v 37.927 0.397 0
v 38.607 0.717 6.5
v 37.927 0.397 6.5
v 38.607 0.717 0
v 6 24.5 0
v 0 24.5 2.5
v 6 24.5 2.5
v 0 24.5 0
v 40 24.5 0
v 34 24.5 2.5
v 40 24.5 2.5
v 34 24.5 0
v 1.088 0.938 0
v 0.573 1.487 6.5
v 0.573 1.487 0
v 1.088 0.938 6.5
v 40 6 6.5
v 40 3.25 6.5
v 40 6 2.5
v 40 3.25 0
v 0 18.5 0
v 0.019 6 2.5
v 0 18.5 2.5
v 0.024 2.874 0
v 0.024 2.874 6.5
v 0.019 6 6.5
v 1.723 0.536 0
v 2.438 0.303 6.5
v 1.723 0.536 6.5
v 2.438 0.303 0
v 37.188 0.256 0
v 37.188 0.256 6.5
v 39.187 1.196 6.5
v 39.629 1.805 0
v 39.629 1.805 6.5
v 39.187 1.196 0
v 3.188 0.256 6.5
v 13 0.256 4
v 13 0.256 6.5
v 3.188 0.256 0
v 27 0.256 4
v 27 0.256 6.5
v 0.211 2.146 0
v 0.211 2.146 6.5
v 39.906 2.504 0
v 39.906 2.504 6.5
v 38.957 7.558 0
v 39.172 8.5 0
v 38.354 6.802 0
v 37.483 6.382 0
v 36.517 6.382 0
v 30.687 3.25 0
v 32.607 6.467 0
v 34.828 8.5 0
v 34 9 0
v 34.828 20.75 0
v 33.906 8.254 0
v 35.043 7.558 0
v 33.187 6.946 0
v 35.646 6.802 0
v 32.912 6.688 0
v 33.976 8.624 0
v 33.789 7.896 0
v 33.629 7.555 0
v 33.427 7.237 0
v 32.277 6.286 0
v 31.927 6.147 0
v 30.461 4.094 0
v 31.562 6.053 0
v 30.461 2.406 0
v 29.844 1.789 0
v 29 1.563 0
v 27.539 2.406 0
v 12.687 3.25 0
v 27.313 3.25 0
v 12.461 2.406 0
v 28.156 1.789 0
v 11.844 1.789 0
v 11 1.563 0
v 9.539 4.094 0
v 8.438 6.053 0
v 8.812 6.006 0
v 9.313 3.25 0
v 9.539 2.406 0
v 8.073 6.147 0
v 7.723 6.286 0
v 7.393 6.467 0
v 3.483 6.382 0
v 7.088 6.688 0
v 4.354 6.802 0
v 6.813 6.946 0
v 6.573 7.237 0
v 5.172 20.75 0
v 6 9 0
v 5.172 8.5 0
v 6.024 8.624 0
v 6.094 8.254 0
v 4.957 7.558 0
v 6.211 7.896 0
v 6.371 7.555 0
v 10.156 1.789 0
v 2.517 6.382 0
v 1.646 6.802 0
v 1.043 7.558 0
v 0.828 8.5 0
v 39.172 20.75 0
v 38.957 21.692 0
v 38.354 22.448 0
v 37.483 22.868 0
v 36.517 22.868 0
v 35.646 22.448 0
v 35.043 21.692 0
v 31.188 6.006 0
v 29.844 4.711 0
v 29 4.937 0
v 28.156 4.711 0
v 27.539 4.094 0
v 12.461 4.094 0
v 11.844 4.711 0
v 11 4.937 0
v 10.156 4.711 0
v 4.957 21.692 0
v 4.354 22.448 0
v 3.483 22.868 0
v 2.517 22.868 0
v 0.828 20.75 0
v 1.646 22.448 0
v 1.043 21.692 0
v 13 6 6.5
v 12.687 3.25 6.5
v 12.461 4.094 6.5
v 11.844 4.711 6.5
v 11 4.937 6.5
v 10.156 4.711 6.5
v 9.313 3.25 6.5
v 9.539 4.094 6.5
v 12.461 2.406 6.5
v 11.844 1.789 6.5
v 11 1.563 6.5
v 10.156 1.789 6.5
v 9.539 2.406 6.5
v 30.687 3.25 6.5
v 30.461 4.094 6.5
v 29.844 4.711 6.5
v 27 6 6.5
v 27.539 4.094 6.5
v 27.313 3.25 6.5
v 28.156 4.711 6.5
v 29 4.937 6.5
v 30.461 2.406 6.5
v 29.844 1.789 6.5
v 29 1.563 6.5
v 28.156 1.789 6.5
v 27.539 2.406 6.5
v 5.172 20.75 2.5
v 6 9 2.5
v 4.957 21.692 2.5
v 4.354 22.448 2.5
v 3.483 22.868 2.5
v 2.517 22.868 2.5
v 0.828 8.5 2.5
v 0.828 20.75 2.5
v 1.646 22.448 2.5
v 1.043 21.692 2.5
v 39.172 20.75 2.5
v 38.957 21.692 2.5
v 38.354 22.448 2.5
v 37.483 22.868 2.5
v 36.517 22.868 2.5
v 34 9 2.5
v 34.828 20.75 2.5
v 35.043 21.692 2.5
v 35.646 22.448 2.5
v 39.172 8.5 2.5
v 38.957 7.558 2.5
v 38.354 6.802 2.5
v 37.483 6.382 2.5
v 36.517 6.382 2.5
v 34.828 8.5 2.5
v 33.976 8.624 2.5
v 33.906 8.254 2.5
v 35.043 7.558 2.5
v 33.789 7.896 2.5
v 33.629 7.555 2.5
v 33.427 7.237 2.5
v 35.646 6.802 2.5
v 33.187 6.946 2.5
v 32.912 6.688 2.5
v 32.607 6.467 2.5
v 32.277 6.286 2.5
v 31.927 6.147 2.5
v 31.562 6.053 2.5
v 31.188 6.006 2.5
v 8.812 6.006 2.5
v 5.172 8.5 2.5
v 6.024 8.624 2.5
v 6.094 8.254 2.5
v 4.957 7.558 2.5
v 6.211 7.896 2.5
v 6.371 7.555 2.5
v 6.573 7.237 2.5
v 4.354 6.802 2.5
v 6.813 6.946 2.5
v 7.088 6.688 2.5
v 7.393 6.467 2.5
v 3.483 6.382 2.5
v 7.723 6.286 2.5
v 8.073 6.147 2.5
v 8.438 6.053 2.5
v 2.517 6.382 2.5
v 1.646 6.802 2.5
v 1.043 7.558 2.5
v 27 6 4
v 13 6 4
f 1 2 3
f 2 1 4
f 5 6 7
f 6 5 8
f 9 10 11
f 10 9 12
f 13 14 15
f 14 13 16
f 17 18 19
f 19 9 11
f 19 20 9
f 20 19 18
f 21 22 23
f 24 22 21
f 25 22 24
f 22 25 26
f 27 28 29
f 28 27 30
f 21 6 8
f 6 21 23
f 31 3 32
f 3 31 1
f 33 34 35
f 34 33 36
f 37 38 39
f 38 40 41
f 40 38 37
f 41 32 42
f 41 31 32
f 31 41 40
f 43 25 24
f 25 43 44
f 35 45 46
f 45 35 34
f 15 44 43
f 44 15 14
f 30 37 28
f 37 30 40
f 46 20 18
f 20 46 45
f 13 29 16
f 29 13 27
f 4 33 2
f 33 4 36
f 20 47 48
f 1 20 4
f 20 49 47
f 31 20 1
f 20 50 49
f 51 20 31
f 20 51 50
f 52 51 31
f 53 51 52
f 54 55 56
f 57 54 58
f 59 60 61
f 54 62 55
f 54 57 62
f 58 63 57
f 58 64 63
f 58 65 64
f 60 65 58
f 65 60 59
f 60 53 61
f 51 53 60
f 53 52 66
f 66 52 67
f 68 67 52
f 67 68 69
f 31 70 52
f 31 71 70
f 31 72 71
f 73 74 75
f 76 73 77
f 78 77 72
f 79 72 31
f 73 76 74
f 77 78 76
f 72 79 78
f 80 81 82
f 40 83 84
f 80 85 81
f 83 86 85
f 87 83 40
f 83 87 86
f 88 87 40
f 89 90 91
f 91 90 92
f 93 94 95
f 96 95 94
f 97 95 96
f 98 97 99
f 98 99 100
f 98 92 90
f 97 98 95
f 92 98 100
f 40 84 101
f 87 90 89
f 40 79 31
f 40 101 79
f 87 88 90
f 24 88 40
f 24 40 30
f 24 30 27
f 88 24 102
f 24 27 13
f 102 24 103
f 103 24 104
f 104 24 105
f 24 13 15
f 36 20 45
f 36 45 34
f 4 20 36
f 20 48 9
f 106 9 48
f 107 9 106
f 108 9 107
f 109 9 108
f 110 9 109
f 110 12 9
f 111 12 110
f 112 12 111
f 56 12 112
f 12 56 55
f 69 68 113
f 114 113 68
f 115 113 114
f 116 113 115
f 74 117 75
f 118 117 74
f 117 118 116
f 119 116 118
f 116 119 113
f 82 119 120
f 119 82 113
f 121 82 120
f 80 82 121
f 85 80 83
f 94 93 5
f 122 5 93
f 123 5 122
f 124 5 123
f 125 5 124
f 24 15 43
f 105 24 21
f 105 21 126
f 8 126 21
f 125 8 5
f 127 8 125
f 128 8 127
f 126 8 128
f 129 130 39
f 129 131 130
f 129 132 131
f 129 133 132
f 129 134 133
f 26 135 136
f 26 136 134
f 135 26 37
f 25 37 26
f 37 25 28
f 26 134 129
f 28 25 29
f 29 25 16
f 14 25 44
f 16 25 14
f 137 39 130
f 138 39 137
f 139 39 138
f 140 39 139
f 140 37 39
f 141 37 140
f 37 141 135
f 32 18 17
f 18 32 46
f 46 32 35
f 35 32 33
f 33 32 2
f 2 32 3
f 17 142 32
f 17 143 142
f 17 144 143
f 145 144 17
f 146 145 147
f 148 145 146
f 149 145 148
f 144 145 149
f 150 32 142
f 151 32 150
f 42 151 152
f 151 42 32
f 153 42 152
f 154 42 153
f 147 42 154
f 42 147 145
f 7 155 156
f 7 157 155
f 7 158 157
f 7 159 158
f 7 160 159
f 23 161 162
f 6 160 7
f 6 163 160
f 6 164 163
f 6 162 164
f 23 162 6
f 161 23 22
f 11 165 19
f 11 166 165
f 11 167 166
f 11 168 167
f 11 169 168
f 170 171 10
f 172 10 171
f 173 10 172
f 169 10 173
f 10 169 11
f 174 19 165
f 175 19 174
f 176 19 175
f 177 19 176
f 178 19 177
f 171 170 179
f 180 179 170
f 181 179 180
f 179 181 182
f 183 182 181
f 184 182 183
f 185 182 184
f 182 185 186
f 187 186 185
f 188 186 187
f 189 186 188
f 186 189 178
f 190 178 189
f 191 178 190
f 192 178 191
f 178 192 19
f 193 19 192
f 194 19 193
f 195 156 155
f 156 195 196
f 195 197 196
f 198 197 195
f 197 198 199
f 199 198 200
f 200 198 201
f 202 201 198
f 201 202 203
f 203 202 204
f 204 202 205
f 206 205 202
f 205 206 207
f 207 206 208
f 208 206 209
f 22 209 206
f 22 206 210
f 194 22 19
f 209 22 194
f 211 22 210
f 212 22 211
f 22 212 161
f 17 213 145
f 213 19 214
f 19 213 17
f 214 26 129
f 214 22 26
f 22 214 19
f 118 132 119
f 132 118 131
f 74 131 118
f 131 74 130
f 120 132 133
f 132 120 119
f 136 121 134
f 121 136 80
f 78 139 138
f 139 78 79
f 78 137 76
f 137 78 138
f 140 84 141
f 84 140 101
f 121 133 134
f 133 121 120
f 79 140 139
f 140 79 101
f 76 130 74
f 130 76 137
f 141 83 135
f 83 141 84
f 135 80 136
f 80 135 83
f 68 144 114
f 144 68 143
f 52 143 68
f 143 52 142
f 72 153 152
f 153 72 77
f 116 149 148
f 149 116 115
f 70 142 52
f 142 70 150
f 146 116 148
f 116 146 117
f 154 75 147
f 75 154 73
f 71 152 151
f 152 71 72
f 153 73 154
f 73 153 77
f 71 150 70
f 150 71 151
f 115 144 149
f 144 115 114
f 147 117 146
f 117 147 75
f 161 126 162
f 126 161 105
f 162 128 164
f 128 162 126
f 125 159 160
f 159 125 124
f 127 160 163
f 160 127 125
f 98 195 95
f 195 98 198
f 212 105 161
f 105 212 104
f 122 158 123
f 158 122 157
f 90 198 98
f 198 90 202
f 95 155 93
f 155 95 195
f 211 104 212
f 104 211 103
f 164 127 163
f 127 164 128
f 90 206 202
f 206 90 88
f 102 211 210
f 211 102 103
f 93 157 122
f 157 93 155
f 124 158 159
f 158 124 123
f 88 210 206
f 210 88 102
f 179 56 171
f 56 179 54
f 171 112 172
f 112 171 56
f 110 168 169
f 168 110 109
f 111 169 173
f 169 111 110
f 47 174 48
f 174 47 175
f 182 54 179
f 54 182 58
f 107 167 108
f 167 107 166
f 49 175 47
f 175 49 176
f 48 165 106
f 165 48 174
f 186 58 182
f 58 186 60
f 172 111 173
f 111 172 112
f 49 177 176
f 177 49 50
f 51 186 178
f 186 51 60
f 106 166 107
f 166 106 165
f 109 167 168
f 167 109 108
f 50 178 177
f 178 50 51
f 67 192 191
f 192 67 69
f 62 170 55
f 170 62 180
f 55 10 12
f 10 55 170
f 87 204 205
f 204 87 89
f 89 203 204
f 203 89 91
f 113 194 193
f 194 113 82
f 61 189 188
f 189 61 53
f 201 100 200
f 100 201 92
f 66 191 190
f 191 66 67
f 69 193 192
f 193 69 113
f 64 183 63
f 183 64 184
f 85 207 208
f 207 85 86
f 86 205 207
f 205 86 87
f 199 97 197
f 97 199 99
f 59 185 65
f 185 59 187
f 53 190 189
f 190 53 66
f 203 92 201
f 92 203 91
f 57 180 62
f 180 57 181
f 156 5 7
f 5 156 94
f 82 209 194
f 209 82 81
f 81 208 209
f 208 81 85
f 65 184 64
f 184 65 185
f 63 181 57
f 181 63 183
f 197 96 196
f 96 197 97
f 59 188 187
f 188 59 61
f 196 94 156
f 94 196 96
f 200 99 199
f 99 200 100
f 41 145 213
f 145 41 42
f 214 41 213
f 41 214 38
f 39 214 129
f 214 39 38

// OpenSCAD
//Reprap differential IR sensor adjustable mount for E3D Chimera hotend (mounts to fan)
// CCBYNC Copyright Mark Benson 2016

// Openscad recreation and remix of thingiverse.com/thing:950478

// This remix is slightly sturdier and includes adjustable mounting holes.

//Fan mount holes 24mm centres
//IR Board mount holes 18mm centres

//Height (distance apart) 6mm min
//Aming for ~4mm adjustment (if poss)

//Mounting holes are
//3.5mm & 2.5mm holes

// REMIX by Stephen Wood (2018)
// Added Variables so that the mount can be used with different sized fans
// Added Variables so the horzontal offset between the fan and the probe can be adjusted
// Because these are small holes, they use "polyholes"
// http://hydraraptor.blogspot.com/2011/02/polyholes.html

// 2018-06-11 - Original implemtation of polyholes worked at 3.5mm but was worse at 2.5mm
// Adjustments being made.
// https://gilesbathgate.com/2016/02/07/polyholes-revisited/

Lg_hole = 3.5;          // Large mounting holes
Sm_hole = 2.5;          // Small mounting holes

Corner = 6.0;             // The Radiused lower corners of the bracket
Offset = 6.5;           // This is how thick the bracket will be
Bracket_height = 18.5;   // This is how tall the overall bracket will be
Fan_size = 40.0;          // The size of the fan (originally 30mm)
Fan_flange = 2.5;       // Thickness of the fan flange
IR_size = 18.0;           // The separation between the mounting holes for the IR Probe

Duct_width = Fan_size - 2.0*Corner;
Hole_wall = 2.0;          // The minmum wall around a hole

Slot_length = Bracket_height-Corner; 
                          // How long to make the adjustable slots                   
nozzle_dia=0.4;             // PolyHoles will get smaller as this decreases
layer_height=0.2;           // PolyHoles will get bigger as this decreases  

function pi() = 3.141592;
function width(d,h) = h-(pi()*((h*h)-(d*d)))/(4*h);
function arc(r,t) = 0.5*(t+sqrt((t*t)+4*(r*r)));
function polyhole(r,n,t) = arc(r,t)/cos(180/n);

function sides(d,t) = ceil(180 / acos((d-t)/d));

module hole(d,h)
{
  n=sides(d,0.1);
  t=width(nozzle_dia,layer_height);
  pr=polyhole(d/2,n,t);
  echo(d,n,pr*2);
  translate([0,0,-1])cylinder(r=pr,h=h+2,$fn=n);    
}

difference()
{
    //Main body
    hull()
    {
        translate([Corner/2,Offset/2,0])
        cylinder(d=Corner, h=Offset, $fn=25);
    
        translate([(Corner/2)+(Fan_size-Corner),Offset/2,0])
        cylinder(d=Corner, h=Offset, $fn=25);
     
        translate([0,Bracket_height,0])
        cube([Fan_size,Corner,Offset]);   
    }
    
    //Cut big section from main body
    translate([0,Corner,Fan_flange])
    cube([Fan_size,Offset+IR_size,Offset-Fan_flange]);
    
    //Left IR mounting hole
    translate([(Fan_size/2)-(IR_size/2),Offset/2,0])
    hole(Sm_hole,Offset);
    
    //Right IR mounting hole
    translate([(Fan_size/2)+(IR_size/2),Offset/2,0])
    rotate([0,0,180])
    hole(Sm_hole,Offset);
    
    //Left fan mount slot
    translate([0,0,0])
    hull()
    {
        translate([Corner/2,Bracket_height+Corner-(Lg_hole/2)-Hole_wall,0])
        hole(Lg_hole,Offset);
        
        translate([Corner/2,Bracket_height+Corner-Slot_length-Lg_hole,0])
        rotate([0,0,180])
        hole(Lg_hole,Offset);
    }
    
    //Right fan mount slot
    translate([Fan_size-Corner,0,0])
    hull()
    {
        translate([Corner/2,Bracket_height+Corner-(Lg_hole/2)-Hole_wall,0])
        hole(Lg_hole,Offset);
        
        translate([Corner/2,Bracket_height+Corner-Slot_length-Lg_hole,0])
        rotate([0,0,180])
        hole(Lg_hole,Offset);
    }
    
    //Cutout between mounting slots for fan
    translate([(Duct_width/2)-Corner+Hole_wall/2,(Duct_width/2)-Corner+Hole_wall/2,0])
    hull()
    {
        translate([0,0,0])
        cylinder(d=Corner, h=Offset, $fn=50);
    
        translate([Duct_width-Corner,0,0])
        cylinder(d=Corner, h=Offset, $fn=50);
        
        translate([0,Duct_width-Corner,0])
        cylinder(d=Corner, h=Offset, $fn=50);
    
        translate([Duct_width-Corner,Duct_width-Corner,0])
        cylinder(d=Corner, h=Offset, $fn=50);    
    }
    
    //Cutout between IR mount holes
    translate([(Fan_size/2)-(IR_size/2)+Hole_wall,0,Offset-2.5])
    cube([IR_size-2*Hole_wall,Corner,Offset]); 

}
